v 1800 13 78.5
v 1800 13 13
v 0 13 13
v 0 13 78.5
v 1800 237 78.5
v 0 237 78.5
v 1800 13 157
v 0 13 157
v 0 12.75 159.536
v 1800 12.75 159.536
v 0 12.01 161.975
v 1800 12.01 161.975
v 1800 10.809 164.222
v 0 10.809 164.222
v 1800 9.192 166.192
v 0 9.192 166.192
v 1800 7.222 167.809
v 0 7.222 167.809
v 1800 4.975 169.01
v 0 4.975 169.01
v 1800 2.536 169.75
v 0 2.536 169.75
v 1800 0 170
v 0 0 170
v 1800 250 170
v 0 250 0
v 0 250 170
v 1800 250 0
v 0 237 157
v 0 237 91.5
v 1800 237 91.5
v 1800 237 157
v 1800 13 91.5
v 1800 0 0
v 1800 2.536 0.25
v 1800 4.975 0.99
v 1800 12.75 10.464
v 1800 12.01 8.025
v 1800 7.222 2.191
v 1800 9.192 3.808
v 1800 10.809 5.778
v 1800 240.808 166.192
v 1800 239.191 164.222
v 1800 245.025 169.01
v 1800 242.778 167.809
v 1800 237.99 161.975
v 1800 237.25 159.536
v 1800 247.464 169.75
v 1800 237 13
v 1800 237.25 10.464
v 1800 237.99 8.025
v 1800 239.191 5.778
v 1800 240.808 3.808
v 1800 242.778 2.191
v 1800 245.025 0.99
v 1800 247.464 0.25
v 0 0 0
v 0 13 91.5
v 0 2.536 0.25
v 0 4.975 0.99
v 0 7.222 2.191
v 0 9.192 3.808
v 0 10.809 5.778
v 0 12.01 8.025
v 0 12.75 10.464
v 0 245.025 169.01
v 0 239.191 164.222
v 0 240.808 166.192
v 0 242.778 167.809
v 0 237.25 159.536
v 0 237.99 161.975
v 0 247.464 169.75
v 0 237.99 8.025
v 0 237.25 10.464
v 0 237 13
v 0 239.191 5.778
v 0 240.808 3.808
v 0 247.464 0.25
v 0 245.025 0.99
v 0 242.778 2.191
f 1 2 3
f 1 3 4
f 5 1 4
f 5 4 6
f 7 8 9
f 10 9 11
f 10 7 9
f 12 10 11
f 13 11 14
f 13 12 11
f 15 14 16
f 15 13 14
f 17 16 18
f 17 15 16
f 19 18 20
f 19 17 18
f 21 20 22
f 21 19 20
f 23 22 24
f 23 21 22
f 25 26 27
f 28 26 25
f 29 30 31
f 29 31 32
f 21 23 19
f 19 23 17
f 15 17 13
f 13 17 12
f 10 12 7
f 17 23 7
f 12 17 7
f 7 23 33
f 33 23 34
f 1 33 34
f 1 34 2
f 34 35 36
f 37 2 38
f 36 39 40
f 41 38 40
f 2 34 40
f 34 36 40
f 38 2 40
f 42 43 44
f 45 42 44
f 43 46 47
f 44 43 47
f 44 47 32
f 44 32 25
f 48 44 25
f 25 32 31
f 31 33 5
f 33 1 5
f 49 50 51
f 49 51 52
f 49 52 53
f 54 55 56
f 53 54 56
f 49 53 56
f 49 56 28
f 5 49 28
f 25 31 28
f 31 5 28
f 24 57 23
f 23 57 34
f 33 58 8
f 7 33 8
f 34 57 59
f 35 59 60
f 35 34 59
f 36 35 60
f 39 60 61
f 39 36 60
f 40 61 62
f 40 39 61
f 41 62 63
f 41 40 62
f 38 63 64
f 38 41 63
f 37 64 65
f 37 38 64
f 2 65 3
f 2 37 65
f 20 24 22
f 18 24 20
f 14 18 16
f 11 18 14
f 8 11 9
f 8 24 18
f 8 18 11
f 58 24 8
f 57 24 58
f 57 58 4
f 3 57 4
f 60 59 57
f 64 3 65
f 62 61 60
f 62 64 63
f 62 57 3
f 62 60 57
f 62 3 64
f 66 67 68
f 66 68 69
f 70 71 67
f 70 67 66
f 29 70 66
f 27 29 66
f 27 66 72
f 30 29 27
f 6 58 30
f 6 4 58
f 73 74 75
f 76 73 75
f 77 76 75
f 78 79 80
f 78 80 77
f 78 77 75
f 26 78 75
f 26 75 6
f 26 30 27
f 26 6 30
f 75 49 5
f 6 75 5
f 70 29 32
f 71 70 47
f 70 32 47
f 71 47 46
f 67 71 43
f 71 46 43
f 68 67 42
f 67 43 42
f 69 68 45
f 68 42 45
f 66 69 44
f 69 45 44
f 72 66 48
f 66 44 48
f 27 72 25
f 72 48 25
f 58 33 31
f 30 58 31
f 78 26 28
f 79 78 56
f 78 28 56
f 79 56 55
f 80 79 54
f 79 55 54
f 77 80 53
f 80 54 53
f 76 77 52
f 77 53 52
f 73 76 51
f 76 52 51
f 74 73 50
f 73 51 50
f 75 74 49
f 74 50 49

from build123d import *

# Parameters (mm, degrees)
SKETCH_1_W          = 1800
SKETCH_1_H          = 250
EXTRUDE_1_DEPTH     = 170
SKETCH_4_W          = 78.5
SKETCH_4_H          = 224
CUT_EXTRUDE_4_DEPTH = 1826.212316417
FILLET_1_R          = 13
FILLET_2_R          = 13
FILLET_3_R          = 13
FILLET_4_R          = 13


with BuildPart() as part:
    # 草图1 → 拉伸1 (new body)
    with BuildSketch(Plane.XY):
        with Locations((900, 125)):
            Rectangle(SKETCH_1_W, SKETCH_1_H)
    extrude(amount=EXTRUDE_1_DEPTH)

    # 草图4 → 切除-拉伸4 (cut, through all)
    with BuildSketch(Plane.ZY):
        with Locations((39.25, 125)):
            Rectangle(SKETCH_4_W, SKETCH_4_H)
        with Locations((130.75, 125)):
            Rectangle(SKETCH_4_W, SKETCH_4_H)
    extrude(amount=-CUT_EXTRUDE_4_DEPTH, mode=Mode.SUBTRACT)

    # 圆角1
    fillet_1_edges = [part.edges().sort_by_distance(p)[0] for p in [
        (900, 13, 170),
    ]]
    fillet(fillet_1_edges, radius=FILLET_1_R - 0.0001)  # a hair under: the kernel refuses the full size

    # 圆角2
    fillet_2_edges = [part.edges().sort_by_distance(p)[0] for p in [
        (900, 13, 0),
    ]]
    fillet(fillet_2_edges, radius=FILLET_2_R - 0.0001)  # a hair under: the kernel refuses the full size

    # 圆角3
    fillet_3_edges = [part.edges().sort_by_distance(p)[0] for p in [
        (900, 237, 170),
    ]]
    fillet(fillet_3_edges, radius=FILLET_3_R - 0.0001)  # a hair under: the kernel refuses the full size

    # 圆角4
    fillet_4_edges = [part.edges().sort_by_distance(p)[0] for p in [
        (900, 237, 0),
    ]]
    fillet(fillet_4_edges, radius=FILLET_4_R - 0.0001)  # a hair under: the kernel refuses the full size


solid = part.part
